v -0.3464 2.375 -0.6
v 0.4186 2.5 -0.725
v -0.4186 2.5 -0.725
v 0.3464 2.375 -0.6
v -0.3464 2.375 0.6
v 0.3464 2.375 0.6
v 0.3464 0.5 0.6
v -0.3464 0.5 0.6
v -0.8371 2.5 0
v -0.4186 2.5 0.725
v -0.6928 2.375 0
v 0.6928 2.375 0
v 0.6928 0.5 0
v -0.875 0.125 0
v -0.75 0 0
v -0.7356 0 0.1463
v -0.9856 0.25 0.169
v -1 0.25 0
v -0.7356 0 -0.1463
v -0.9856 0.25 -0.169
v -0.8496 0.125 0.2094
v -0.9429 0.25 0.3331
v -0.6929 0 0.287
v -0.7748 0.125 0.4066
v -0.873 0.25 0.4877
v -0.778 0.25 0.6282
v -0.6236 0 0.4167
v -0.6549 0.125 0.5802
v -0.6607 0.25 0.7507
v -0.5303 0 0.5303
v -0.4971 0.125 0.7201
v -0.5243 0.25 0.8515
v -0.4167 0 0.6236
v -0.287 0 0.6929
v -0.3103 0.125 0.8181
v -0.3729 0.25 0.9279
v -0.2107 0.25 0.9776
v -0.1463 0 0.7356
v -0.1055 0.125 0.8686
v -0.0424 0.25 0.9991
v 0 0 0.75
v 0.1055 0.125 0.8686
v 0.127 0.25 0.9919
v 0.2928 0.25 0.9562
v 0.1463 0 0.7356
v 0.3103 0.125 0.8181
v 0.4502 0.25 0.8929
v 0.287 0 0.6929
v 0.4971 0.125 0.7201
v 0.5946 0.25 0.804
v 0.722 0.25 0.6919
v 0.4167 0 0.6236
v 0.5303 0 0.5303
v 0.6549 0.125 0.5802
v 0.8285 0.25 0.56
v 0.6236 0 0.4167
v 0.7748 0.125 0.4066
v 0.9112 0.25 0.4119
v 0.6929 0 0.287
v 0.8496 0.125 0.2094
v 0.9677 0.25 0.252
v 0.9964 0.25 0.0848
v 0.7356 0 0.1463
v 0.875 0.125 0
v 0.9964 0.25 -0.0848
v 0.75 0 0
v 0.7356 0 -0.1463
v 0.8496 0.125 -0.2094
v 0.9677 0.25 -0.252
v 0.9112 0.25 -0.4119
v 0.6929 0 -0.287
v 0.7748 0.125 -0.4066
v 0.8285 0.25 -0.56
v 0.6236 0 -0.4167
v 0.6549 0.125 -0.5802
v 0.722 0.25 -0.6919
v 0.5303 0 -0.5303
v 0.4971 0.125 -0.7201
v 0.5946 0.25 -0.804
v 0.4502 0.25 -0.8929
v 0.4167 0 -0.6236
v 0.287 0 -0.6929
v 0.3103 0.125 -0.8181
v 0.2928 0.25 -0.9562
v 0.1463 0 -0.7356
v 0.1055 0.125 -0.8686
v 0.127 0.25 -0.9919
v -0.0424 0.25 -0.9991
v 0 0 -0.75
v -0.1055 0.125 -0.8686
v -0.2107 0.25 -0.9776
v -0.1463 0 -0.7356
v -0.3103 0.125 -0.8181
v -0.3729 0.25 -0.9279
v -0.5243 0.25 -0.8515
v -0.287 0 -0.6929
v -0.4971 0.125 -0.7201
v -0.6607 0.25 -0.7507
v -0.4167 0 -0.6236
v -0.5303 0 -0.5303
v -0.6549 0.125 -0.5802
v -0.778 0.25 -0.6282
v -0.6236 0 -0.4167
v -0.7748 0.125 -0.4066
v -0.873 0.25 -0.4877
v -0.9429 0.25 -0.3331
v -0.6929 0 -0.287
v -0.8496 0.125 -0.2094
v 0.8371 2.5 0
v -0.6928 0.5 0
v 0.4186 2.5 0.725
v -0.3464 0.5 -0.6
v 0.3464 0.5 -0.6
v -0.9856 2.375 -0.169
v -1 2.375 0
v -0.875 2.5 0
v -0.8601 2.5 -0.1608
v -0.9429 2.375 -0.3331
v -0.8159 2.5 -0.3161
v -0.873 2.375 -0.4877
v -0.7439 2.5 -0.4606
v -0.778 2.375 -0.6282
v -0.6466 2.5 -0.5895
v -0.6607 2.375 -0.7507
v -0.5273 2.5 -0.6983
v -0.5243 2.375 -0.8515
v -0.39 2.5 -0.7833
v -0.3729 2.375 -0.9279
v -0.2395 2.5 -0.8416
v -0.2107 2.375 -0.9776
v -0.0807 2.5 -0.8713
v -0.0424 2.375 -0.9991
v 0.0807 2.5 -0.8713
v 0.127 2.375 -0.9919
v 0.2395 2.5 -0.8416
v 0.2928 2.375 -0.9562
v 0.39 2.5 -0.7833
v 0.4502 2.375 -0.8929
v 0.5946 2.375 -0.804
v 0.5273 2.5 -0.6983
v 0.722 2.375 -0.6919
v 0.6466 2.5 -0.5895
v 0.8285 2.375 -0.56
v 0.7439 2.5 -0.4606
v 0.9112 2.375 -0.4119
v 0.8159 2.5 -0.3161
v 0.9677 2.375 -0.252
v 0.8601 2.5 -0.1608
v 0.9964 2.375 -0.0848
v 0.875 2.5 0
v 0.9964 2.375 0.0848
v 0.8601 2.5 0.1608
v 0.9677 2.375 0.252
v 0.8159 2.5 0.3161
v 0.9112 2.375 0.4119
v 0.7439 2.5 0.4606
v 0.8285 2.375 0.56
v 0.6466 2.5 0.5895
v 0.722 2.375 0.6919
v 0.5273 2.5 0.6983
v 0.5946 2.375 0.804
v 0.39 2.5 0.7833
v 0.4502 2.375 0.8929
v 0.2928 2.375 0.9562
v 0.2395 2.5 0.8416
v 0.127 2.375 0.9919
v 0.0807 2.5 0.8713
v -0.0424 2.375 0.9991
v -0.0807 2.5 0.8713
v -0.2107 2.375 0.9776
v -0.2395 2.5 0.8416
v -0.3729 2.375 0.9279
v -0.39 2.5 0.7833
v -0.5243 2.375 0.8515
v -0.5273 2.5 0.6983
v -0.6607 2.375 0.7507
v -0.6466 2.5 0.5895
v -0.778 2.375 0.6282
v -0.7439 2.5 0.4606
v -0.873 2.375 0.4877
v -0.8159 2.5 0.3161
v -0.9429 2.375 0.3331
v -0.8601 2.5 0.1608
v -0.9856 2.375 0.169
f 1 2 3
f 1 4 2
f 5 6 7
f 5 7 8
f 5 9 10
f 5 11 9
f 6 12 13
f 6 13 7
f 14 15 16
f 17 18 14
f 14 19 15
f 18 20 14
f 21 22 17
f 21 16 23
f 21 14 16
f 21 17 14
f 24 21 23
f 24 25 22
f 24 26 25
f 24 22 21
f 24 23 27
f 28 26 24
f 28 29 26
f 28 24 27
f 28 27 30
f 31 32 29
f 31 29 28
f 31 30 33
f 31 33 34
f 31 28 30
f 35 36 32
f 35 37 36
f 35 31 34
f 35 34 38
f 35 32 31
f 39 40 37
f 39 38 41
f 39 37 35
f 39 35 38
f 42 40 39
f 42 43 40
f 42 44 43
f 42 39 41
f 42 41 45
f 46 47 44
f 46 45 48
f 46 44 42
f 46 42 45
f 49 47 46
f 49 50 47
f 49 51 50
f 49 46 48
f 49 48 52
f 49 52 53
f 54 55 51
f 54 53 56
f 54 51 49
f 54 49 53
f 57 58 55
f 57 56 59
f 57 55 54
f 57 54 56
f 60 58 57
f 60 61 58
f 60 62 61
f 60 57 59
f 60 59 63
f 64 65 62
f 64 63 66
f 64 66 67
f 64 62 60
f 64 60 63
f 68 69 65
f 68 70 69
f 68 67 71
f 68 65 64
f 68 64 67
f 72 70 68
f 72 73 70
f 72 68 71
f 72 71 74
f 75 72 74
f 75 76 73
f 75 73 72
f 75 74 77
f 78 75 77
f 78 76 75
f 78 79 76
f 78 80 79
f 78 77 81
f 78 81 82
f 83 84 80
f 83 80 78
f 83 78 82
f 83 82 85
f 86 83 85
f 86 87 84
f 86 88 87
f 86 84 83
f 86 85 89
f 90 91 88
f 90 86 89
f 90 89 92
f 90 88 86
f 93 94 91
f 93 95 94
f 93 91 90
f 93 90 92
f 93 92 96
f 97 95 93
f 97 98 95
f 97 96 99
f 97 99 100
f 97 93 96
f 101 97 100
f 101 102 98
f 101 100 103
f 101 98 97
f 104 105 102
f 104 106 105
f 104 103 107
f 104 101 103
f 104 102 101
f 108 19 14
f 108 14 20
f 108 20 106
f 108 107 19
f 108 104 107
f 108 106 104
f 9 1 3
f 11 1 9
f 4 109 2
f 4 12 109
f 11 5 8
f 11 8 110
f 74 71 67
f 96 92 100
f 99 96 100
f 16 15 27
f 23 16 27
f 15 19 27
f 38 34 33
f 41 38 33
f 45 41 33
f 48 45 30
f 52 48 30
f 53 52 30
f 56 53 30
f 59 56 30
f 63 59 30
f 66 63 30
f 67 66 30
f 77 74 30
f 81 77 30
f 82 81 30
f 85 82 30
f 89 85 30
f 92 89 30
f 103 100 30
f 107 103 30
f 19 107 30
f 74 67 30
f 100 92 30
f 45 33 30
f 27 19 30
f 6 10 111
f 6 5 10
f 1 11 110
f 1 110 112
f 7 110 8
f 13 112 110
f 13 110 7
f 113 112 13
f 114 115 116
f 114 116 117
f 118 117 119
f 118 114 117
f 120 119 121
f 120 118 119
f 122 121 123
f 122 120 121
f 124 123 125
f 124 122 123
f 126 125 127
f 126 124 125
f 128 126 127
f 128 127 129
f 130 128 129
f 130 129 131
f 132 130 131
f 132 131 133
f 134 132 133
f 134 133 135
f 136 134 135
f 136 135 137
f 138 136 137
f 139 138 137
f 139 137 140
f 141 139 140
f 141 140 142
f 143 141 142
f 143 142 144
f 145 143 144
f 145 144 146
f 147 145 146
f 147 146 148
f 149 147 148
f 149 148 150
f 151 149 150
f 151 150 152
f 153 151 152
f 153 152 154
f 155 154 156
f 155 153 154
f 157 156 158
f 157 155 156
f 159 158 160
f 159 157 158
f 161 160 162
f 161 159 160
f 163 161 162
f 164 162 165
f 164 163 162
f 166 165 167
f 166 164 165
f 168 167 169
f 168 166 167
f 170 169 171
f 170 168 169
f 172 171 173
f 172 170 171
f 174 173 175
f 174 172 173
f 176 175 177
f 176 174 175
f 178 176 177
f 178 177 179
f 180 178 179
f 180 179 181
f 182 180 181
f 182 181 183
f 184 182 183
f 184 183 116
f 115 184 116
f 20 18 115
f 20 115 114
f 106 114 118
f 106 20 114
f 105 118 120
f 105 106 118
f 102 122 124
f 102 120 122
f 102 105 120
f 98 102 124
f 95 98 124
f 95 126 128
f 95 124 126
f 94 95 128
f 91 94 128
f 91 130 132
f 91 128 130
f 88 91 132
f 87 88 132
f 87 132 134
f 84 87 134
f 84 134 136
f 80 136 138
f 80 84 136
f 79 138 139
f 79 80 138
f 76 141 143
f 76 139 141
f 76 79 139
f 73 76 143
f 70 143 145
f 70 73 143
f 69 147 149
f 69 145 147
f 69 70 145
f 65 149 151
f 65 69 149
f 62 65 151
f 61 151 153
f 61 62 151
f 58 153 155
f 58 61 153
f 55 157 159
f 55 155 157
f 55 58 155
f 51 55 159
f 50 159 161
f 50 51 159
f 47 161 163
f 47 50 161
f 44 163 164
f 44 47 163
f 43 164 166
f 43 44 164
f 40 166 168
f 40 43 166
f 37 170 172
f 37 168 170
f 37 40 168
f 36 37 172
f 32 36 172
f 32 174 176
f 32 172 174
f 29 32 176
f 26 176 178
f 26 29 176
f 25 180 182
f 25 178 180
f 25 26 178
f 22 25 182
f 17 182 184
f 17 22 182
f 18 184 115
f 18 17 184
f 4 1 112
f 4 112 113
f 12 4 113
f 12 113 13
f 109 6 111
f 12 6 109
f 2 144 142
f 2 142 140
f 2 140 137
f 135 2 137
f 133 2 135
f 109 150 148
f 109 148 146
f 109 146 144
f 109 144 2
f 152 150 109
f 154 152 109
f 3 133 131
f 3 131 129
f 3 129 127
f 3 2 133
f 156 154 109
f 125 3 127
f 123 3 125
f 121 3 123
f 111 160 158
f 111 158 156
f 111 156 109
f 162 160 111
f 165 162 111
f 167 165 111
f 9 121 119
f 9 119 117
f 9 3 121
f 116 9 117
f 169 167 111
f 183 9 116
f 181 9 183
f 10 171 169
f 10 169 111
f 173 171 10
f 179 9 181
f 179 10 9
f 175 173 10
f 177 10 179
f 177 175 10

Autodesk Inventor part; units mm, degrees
ref_plane "YZ Plane" through (0, 0, 0) normal (1, 0, 0) x (0, 1, 0)
ref_plane "XZ Plane" through (0, 0, 0) normal (0, 1, 0) x (-1, 0, 0)
ref_plane "XY Plane" through (0, 0, 0) normal (0, 0, 1) x (1, 0, 0)
sketch "草圖1" plane through (0, 0, 0) normal (0, 1, 0) x (-1, 0, 0)
  circle A0 centre (0, 0) radius 1
  dimension "d0" = 2
extrude "擠出1" add sketch "草圖1" along normal blind 2.5
thread "螺紋1" size "M2x0.4" class "6g" standard "ANSI Metric M Profile" full length
chamfer "倒角1" distance 0.25 angle 45 1 edges at (1, 0, 0)
sketch "草圖2" plane through (0, 2.5, 0) normal (0, 1, 0) x (1, 0, 0)
  circle A0 centre (0, 0) radius 1 projected
  line L0 (0.3464, 0.6) -> (0.6928, 0)
  line L1 (0.6928, 0) -> (0.3464, -0.6)
  line L2 (0.3464, -0.6) -> (-0.3464, -0.6)
  line L3 (-0.3464, -0.6) -> (-0.6928, 0)
  line L4 (-0.6928, 0) -> (-0.3464, 0.6)
  line L5 (-0.3464, 0.6) -> (0.3464, 0.6)
  dimension "d9" = 1.2
extrude "擠出2" cut sketch "草圖2" against normal blind 2 contours L0 L1 L2 L3 L4 L5
chamfer "倒角2" distance 0.125 angle 45 7 edges at (1, 2.5, 0) (0.5196, 2.5, -0.3) (0.5196, 2.5, 0.3) (0, 2.5, 0.6) (-0.5196, 2.5, 0.3) (-0.5196, 2.5, -0.3) (0, 2.5, -0.6)
properties part number "screw_M2_2"
